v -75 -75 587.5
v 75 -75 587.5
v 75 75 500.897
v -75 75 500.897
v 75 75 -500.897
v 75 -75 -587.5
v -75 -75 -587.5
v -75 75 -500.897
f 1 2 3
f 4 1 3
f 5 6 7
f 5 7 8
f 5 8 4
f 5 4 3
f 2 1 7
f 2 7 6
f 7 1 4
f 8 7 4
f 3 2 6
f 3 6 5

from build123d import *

# Parameters (mm, degrees)
F0_W     = 150
F0_H     = 150
F1_DEPTH = 587.5
F3_DEPTH = 150


# Not quite as in the source:
# - a pattern or mirror of a feature is missing from the dataset's text; its kind, count and spacing are read off the source's solid


with BuildPart() as f1:
    # F0 (on Top) → F1 (new body, symmetric)
    with BuildSketch(Plane.XY):
        Rectangle(F0_W, F0_H)
    extrude(amount=F1_DEPTH, both=True)

    # F2 (on face) → F3 (cut, through all)
    with BuildSketch(Plane.YZ.offset(75)):
        Polygon((75, 587.5), (-75, 587.5), (75, 500.8974596216), align=None)
    f3 = extrude(amount=-F3_DEPTH, mode=Mode.SUBTRACT)

    # F3_copies: F3 across plane
    add(f3.mirror(Plane(origin=(0, 0, 0), x_dir=(-1, 0, 0), z_dir=(0, 0, -1))), mode=Mode.SUBTRACT)


solid = f1.part
